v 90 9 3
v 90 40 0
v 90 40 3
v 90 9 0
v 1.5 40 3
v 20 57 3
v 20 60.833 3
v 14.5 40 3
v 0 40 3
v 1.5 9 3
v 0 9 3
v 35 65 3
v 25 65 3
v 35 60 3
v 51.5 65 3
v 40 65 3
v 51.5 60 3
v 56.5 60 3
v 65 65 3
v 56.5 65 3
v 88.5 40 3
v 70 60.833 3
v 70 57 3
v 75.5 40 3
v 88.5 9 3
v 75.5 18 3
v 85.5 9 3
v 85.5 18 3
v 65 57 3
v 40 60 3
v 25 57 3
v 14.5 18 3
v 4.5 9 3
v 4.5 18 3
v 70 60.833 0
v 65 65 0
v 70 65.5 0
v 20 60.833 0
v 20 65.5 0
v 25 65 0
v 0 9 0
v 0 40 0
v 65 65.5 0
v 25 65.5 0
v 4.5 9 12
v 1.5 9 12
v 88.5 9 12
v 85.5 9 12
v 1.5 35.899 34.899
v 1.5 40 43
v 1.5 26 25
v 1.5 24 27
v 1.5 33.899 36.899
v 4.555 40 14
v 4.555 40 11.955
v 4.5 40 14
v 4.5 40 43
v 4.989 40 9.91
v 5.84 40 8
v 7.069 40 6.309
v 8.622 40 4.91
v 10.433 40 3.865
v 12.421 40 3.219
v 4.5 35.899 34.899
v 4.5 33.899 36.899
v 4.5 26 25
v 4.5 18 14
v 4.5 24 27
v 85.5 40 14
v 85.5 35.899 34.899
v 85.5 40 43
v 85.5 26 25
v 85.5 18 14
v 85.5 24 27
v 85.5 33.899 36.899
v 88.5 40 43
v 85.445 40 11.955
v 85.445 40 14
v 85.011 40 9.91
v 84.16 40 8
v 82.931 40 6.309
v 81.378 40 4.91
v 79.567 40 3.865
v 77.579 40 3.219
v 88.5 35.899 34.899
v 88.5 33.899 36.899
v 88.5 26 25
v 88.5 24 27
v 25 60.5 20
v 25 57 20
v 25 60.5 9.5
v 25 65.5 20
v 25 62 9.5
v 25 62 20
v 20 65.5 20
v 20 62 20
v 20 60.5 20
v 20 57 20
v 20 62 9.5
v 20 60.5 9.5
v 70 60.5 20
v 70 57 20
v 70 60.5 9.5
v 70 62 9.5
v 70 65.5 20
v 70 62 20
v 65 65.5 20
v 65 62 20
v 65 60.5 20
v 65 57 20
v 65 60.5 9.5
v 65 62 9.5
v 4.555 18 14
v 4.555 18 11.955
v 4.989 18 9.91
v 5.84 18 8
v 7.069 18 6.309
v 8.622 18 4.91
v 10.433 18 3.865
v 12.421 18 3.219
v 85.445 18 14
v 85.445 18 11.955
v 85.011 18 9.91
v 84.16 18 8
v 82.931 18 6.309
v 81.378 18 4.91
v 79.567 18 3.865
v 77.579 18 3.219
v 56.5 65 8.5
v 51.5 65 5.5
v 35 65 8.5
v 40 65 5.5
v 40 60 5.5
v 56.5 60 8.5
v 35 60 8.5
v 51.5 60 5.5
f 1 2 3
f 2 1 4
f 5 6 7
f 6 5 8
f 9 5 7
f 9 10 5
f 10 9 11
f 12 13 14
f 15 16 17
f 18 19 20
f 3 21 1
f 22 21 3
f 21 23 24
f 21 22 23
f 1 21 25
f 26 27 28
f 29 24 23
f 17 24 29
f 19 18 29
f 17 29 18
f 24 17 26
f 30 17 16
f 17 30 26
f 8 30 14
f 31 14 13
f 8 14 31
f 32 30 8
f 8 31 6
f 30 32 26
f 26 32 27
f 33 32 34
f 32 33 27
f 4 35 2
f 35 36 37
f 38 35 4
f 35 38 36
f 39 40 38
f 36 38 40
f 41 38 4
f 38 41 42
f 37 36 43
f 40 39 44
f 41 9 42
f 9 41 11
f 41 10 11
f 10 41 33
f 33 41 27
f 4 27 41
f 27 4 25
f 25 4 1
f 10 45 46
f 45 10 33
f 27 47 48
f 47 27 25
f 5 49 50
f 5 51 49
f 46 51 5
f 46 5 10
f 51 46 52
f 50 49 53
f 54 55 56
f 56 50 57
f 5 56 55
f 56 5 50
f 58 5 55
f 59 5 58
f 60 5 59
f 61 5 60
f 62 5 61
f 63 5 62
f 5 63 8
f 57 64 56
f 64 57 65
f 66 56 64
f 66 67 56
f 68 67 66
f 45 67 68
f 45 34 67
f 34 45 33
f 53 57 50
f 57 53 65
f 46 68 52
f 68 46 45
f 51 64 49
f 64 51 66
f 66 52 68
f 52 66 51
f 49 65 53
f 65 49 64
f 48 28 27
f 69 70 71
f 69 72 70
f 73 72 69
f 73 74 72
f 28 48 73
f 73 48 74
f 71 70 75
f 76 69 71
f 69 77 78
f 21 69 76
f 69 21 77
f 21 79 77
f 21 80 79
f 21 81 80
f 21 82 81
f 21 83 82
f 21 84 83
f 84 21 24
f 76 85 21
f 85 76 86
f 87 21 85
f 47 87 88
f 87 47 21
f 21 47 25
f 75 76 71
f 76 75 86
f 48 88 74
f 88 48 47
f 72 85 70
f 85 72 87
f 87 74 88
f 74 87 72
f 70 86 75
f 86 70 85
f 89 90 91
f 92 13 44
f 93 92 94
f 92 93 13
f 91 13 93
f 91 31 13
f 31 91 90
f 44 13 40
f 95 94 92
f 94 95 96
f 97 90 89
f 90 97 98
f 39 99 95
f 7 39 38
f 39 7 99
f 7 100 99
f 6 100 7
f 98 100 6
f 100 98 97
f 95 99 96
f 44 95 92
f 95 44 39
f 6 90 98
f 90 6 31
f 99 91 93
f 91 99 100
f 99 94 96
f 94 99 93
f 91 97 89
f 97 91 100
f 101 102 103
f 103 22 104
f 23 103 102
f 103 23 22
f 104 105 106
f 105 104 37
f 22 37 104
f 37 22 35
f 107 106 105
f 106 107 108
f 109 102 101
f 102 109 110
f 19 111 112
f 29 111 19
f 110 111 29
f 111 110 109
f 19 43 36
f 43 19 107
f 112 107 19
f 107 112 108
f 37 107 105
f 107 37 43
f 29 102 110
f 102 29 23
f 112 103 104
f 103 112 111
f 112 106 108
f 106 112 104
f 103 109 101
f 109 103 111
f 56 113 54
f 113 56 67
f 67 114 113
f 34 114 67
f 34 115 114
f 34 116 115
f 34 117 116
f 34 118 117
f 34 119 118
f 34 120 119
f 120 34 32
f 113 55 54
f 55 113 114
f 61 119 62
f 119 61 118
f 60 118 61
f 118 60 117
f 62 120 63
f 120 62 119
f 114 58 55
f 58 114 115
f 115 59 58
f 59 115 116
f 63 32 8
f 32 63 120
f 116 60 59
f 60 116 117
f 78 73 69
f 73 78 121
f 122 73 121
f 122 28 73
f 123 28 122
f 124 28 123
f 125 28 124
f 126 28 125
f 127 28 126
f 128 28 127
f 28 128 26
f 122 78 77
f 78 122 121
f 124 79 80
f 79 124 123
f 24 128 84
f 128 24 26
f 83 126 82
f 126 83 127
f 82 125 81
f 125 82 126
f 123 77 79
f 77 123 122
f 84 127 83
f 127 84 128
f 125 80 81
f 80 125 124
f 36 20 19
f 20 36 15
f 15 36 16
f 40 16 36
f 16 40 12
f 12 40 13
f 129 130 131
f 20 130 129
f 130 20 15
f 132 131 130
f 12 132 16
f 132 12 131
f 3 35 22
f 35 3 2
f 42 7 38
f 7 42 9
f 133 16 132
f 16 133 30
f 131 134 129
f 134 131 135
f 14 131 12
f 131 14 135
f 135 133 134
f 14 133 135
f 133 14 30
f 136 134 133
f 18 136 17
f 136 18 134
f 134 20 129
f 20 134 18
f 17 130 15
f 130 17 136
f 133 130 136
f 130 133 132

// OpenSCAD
triangle_s = 40; // Triangle's Base and Height

oled_perf_board_size = 14;



module substr_perf(){
    translate([-1, 26, 25]) 
rotate([45,0,0])
cube([92,oled_perf_board_size,3.5]);
    }


// Upright Triangle Module:

module oled_holder_triangle(X_trans){

translate([X_trans, 40, 3]) 

rotate([180,-90,0])
    linear_extrude(height = 3) {
    polygon(points=[
        [0, 0], [
        0, triangle_s], 
        [triangle_s, 0]
    ]);
}
    
}

module front_cutoff (){
   translate([-1, -1, -1]) 
   cube([92,10,20]); // DIS CUBE
    }

// ====== Actual Geometric Instanciations ===

//Triangle Base-plate
difference(){
    
    cube([90,triangle_s,3]);
    front_cutoff();
    }


difference() {
    oled_holder_triangle(1.5);
    substr_perf();
    front_cutoff();
}

difference() {
    oled_holder_triangle(90-4.5);
    substr_perf();    
    front_cutoff();
}

// ====== Back side (Trapezoidal Part) of the chassis) ======

translate([20, triangle_s, 0]) 
cube([48,25,3]); //Rectangle in the middle of triangles

//Trapezoid base triangles
trap_triangle_s = 24;

translate([90-trap_triangle_s, triangle_s, 0]) 
    linear_extrude(height = 3) {
    polygon(points=[
        [0, 0], [
        0, trap_triangle_s+1], 
        [trap_triangle_s, 0]
    ]);
}

rotate([0,180,0])
translate([-trap_triangle_s, triangle_s, -3]) 
    linear_extrude(height = 3) {
    polygon(points=[
        [0, 0], [
        0, trap_triangle_s+1], 
        [trap_triangle_s, 0]
    ]);
}

// MUX Holder

module mux_hold(X_trans){


difference() { 
translate([X_trans, triangle_s+17, 0]) 
cube([5,8.5,20]); // RECT BLOCK

translate([X_trans-1, triangle_s+20.5, 9.5]) 
cube([7,1.5,20]); //Rectangle in the middle of triangles
}

}

mux_hold(20);
mux_hold(20+90/2);

// Header Pin out

PINOUT_W = 11.5; // 1.15 cm
PINOUT_H = 2.5; // 2.5 mm

offset_pinout = 35;

translate([offset_pinout, triangle_s+20, 3]) 
cube([5,5,5.5]); //Rectangle in the middle of triangles

translate([offset_pinout+PINOUT_W+5, triangle_s+20, 3]) 
cube([5,5,5.5]); //Rectangle in the middle of triangles

translate([offset_pinout+2.5, triangle_s+20, 3+PINOUT_H]) 
cube([PINOUT_W+5,5,3]); //Rectangle in the middle of triangles

// ==== FILETS done MANUALLY =====

Triangle_Filet_R = 10;

difference() {

translate([2,Triangle_Filet_R+8,0])
cube([12.5, 22,14]);

rotate([90,90,0])
translate([-Triangle_Filet_R-3,Triangle_Filet_R+4.5,-42.5])
cylinder(h=25, r =Triangle_Filet_R);


}

difference() {

translate([122/2+4.5+Triangle_Filet_R,Triangle_Filet_R+8,0])
cube([12.5, 22,14]);

rotate([90,90,0])
translate([-Triangle_Filet_R-3,122/2+Triangle_Filet_R+4.5,-42.5])
cylinder(h=25, r =Triangle_Filet_R);


}
